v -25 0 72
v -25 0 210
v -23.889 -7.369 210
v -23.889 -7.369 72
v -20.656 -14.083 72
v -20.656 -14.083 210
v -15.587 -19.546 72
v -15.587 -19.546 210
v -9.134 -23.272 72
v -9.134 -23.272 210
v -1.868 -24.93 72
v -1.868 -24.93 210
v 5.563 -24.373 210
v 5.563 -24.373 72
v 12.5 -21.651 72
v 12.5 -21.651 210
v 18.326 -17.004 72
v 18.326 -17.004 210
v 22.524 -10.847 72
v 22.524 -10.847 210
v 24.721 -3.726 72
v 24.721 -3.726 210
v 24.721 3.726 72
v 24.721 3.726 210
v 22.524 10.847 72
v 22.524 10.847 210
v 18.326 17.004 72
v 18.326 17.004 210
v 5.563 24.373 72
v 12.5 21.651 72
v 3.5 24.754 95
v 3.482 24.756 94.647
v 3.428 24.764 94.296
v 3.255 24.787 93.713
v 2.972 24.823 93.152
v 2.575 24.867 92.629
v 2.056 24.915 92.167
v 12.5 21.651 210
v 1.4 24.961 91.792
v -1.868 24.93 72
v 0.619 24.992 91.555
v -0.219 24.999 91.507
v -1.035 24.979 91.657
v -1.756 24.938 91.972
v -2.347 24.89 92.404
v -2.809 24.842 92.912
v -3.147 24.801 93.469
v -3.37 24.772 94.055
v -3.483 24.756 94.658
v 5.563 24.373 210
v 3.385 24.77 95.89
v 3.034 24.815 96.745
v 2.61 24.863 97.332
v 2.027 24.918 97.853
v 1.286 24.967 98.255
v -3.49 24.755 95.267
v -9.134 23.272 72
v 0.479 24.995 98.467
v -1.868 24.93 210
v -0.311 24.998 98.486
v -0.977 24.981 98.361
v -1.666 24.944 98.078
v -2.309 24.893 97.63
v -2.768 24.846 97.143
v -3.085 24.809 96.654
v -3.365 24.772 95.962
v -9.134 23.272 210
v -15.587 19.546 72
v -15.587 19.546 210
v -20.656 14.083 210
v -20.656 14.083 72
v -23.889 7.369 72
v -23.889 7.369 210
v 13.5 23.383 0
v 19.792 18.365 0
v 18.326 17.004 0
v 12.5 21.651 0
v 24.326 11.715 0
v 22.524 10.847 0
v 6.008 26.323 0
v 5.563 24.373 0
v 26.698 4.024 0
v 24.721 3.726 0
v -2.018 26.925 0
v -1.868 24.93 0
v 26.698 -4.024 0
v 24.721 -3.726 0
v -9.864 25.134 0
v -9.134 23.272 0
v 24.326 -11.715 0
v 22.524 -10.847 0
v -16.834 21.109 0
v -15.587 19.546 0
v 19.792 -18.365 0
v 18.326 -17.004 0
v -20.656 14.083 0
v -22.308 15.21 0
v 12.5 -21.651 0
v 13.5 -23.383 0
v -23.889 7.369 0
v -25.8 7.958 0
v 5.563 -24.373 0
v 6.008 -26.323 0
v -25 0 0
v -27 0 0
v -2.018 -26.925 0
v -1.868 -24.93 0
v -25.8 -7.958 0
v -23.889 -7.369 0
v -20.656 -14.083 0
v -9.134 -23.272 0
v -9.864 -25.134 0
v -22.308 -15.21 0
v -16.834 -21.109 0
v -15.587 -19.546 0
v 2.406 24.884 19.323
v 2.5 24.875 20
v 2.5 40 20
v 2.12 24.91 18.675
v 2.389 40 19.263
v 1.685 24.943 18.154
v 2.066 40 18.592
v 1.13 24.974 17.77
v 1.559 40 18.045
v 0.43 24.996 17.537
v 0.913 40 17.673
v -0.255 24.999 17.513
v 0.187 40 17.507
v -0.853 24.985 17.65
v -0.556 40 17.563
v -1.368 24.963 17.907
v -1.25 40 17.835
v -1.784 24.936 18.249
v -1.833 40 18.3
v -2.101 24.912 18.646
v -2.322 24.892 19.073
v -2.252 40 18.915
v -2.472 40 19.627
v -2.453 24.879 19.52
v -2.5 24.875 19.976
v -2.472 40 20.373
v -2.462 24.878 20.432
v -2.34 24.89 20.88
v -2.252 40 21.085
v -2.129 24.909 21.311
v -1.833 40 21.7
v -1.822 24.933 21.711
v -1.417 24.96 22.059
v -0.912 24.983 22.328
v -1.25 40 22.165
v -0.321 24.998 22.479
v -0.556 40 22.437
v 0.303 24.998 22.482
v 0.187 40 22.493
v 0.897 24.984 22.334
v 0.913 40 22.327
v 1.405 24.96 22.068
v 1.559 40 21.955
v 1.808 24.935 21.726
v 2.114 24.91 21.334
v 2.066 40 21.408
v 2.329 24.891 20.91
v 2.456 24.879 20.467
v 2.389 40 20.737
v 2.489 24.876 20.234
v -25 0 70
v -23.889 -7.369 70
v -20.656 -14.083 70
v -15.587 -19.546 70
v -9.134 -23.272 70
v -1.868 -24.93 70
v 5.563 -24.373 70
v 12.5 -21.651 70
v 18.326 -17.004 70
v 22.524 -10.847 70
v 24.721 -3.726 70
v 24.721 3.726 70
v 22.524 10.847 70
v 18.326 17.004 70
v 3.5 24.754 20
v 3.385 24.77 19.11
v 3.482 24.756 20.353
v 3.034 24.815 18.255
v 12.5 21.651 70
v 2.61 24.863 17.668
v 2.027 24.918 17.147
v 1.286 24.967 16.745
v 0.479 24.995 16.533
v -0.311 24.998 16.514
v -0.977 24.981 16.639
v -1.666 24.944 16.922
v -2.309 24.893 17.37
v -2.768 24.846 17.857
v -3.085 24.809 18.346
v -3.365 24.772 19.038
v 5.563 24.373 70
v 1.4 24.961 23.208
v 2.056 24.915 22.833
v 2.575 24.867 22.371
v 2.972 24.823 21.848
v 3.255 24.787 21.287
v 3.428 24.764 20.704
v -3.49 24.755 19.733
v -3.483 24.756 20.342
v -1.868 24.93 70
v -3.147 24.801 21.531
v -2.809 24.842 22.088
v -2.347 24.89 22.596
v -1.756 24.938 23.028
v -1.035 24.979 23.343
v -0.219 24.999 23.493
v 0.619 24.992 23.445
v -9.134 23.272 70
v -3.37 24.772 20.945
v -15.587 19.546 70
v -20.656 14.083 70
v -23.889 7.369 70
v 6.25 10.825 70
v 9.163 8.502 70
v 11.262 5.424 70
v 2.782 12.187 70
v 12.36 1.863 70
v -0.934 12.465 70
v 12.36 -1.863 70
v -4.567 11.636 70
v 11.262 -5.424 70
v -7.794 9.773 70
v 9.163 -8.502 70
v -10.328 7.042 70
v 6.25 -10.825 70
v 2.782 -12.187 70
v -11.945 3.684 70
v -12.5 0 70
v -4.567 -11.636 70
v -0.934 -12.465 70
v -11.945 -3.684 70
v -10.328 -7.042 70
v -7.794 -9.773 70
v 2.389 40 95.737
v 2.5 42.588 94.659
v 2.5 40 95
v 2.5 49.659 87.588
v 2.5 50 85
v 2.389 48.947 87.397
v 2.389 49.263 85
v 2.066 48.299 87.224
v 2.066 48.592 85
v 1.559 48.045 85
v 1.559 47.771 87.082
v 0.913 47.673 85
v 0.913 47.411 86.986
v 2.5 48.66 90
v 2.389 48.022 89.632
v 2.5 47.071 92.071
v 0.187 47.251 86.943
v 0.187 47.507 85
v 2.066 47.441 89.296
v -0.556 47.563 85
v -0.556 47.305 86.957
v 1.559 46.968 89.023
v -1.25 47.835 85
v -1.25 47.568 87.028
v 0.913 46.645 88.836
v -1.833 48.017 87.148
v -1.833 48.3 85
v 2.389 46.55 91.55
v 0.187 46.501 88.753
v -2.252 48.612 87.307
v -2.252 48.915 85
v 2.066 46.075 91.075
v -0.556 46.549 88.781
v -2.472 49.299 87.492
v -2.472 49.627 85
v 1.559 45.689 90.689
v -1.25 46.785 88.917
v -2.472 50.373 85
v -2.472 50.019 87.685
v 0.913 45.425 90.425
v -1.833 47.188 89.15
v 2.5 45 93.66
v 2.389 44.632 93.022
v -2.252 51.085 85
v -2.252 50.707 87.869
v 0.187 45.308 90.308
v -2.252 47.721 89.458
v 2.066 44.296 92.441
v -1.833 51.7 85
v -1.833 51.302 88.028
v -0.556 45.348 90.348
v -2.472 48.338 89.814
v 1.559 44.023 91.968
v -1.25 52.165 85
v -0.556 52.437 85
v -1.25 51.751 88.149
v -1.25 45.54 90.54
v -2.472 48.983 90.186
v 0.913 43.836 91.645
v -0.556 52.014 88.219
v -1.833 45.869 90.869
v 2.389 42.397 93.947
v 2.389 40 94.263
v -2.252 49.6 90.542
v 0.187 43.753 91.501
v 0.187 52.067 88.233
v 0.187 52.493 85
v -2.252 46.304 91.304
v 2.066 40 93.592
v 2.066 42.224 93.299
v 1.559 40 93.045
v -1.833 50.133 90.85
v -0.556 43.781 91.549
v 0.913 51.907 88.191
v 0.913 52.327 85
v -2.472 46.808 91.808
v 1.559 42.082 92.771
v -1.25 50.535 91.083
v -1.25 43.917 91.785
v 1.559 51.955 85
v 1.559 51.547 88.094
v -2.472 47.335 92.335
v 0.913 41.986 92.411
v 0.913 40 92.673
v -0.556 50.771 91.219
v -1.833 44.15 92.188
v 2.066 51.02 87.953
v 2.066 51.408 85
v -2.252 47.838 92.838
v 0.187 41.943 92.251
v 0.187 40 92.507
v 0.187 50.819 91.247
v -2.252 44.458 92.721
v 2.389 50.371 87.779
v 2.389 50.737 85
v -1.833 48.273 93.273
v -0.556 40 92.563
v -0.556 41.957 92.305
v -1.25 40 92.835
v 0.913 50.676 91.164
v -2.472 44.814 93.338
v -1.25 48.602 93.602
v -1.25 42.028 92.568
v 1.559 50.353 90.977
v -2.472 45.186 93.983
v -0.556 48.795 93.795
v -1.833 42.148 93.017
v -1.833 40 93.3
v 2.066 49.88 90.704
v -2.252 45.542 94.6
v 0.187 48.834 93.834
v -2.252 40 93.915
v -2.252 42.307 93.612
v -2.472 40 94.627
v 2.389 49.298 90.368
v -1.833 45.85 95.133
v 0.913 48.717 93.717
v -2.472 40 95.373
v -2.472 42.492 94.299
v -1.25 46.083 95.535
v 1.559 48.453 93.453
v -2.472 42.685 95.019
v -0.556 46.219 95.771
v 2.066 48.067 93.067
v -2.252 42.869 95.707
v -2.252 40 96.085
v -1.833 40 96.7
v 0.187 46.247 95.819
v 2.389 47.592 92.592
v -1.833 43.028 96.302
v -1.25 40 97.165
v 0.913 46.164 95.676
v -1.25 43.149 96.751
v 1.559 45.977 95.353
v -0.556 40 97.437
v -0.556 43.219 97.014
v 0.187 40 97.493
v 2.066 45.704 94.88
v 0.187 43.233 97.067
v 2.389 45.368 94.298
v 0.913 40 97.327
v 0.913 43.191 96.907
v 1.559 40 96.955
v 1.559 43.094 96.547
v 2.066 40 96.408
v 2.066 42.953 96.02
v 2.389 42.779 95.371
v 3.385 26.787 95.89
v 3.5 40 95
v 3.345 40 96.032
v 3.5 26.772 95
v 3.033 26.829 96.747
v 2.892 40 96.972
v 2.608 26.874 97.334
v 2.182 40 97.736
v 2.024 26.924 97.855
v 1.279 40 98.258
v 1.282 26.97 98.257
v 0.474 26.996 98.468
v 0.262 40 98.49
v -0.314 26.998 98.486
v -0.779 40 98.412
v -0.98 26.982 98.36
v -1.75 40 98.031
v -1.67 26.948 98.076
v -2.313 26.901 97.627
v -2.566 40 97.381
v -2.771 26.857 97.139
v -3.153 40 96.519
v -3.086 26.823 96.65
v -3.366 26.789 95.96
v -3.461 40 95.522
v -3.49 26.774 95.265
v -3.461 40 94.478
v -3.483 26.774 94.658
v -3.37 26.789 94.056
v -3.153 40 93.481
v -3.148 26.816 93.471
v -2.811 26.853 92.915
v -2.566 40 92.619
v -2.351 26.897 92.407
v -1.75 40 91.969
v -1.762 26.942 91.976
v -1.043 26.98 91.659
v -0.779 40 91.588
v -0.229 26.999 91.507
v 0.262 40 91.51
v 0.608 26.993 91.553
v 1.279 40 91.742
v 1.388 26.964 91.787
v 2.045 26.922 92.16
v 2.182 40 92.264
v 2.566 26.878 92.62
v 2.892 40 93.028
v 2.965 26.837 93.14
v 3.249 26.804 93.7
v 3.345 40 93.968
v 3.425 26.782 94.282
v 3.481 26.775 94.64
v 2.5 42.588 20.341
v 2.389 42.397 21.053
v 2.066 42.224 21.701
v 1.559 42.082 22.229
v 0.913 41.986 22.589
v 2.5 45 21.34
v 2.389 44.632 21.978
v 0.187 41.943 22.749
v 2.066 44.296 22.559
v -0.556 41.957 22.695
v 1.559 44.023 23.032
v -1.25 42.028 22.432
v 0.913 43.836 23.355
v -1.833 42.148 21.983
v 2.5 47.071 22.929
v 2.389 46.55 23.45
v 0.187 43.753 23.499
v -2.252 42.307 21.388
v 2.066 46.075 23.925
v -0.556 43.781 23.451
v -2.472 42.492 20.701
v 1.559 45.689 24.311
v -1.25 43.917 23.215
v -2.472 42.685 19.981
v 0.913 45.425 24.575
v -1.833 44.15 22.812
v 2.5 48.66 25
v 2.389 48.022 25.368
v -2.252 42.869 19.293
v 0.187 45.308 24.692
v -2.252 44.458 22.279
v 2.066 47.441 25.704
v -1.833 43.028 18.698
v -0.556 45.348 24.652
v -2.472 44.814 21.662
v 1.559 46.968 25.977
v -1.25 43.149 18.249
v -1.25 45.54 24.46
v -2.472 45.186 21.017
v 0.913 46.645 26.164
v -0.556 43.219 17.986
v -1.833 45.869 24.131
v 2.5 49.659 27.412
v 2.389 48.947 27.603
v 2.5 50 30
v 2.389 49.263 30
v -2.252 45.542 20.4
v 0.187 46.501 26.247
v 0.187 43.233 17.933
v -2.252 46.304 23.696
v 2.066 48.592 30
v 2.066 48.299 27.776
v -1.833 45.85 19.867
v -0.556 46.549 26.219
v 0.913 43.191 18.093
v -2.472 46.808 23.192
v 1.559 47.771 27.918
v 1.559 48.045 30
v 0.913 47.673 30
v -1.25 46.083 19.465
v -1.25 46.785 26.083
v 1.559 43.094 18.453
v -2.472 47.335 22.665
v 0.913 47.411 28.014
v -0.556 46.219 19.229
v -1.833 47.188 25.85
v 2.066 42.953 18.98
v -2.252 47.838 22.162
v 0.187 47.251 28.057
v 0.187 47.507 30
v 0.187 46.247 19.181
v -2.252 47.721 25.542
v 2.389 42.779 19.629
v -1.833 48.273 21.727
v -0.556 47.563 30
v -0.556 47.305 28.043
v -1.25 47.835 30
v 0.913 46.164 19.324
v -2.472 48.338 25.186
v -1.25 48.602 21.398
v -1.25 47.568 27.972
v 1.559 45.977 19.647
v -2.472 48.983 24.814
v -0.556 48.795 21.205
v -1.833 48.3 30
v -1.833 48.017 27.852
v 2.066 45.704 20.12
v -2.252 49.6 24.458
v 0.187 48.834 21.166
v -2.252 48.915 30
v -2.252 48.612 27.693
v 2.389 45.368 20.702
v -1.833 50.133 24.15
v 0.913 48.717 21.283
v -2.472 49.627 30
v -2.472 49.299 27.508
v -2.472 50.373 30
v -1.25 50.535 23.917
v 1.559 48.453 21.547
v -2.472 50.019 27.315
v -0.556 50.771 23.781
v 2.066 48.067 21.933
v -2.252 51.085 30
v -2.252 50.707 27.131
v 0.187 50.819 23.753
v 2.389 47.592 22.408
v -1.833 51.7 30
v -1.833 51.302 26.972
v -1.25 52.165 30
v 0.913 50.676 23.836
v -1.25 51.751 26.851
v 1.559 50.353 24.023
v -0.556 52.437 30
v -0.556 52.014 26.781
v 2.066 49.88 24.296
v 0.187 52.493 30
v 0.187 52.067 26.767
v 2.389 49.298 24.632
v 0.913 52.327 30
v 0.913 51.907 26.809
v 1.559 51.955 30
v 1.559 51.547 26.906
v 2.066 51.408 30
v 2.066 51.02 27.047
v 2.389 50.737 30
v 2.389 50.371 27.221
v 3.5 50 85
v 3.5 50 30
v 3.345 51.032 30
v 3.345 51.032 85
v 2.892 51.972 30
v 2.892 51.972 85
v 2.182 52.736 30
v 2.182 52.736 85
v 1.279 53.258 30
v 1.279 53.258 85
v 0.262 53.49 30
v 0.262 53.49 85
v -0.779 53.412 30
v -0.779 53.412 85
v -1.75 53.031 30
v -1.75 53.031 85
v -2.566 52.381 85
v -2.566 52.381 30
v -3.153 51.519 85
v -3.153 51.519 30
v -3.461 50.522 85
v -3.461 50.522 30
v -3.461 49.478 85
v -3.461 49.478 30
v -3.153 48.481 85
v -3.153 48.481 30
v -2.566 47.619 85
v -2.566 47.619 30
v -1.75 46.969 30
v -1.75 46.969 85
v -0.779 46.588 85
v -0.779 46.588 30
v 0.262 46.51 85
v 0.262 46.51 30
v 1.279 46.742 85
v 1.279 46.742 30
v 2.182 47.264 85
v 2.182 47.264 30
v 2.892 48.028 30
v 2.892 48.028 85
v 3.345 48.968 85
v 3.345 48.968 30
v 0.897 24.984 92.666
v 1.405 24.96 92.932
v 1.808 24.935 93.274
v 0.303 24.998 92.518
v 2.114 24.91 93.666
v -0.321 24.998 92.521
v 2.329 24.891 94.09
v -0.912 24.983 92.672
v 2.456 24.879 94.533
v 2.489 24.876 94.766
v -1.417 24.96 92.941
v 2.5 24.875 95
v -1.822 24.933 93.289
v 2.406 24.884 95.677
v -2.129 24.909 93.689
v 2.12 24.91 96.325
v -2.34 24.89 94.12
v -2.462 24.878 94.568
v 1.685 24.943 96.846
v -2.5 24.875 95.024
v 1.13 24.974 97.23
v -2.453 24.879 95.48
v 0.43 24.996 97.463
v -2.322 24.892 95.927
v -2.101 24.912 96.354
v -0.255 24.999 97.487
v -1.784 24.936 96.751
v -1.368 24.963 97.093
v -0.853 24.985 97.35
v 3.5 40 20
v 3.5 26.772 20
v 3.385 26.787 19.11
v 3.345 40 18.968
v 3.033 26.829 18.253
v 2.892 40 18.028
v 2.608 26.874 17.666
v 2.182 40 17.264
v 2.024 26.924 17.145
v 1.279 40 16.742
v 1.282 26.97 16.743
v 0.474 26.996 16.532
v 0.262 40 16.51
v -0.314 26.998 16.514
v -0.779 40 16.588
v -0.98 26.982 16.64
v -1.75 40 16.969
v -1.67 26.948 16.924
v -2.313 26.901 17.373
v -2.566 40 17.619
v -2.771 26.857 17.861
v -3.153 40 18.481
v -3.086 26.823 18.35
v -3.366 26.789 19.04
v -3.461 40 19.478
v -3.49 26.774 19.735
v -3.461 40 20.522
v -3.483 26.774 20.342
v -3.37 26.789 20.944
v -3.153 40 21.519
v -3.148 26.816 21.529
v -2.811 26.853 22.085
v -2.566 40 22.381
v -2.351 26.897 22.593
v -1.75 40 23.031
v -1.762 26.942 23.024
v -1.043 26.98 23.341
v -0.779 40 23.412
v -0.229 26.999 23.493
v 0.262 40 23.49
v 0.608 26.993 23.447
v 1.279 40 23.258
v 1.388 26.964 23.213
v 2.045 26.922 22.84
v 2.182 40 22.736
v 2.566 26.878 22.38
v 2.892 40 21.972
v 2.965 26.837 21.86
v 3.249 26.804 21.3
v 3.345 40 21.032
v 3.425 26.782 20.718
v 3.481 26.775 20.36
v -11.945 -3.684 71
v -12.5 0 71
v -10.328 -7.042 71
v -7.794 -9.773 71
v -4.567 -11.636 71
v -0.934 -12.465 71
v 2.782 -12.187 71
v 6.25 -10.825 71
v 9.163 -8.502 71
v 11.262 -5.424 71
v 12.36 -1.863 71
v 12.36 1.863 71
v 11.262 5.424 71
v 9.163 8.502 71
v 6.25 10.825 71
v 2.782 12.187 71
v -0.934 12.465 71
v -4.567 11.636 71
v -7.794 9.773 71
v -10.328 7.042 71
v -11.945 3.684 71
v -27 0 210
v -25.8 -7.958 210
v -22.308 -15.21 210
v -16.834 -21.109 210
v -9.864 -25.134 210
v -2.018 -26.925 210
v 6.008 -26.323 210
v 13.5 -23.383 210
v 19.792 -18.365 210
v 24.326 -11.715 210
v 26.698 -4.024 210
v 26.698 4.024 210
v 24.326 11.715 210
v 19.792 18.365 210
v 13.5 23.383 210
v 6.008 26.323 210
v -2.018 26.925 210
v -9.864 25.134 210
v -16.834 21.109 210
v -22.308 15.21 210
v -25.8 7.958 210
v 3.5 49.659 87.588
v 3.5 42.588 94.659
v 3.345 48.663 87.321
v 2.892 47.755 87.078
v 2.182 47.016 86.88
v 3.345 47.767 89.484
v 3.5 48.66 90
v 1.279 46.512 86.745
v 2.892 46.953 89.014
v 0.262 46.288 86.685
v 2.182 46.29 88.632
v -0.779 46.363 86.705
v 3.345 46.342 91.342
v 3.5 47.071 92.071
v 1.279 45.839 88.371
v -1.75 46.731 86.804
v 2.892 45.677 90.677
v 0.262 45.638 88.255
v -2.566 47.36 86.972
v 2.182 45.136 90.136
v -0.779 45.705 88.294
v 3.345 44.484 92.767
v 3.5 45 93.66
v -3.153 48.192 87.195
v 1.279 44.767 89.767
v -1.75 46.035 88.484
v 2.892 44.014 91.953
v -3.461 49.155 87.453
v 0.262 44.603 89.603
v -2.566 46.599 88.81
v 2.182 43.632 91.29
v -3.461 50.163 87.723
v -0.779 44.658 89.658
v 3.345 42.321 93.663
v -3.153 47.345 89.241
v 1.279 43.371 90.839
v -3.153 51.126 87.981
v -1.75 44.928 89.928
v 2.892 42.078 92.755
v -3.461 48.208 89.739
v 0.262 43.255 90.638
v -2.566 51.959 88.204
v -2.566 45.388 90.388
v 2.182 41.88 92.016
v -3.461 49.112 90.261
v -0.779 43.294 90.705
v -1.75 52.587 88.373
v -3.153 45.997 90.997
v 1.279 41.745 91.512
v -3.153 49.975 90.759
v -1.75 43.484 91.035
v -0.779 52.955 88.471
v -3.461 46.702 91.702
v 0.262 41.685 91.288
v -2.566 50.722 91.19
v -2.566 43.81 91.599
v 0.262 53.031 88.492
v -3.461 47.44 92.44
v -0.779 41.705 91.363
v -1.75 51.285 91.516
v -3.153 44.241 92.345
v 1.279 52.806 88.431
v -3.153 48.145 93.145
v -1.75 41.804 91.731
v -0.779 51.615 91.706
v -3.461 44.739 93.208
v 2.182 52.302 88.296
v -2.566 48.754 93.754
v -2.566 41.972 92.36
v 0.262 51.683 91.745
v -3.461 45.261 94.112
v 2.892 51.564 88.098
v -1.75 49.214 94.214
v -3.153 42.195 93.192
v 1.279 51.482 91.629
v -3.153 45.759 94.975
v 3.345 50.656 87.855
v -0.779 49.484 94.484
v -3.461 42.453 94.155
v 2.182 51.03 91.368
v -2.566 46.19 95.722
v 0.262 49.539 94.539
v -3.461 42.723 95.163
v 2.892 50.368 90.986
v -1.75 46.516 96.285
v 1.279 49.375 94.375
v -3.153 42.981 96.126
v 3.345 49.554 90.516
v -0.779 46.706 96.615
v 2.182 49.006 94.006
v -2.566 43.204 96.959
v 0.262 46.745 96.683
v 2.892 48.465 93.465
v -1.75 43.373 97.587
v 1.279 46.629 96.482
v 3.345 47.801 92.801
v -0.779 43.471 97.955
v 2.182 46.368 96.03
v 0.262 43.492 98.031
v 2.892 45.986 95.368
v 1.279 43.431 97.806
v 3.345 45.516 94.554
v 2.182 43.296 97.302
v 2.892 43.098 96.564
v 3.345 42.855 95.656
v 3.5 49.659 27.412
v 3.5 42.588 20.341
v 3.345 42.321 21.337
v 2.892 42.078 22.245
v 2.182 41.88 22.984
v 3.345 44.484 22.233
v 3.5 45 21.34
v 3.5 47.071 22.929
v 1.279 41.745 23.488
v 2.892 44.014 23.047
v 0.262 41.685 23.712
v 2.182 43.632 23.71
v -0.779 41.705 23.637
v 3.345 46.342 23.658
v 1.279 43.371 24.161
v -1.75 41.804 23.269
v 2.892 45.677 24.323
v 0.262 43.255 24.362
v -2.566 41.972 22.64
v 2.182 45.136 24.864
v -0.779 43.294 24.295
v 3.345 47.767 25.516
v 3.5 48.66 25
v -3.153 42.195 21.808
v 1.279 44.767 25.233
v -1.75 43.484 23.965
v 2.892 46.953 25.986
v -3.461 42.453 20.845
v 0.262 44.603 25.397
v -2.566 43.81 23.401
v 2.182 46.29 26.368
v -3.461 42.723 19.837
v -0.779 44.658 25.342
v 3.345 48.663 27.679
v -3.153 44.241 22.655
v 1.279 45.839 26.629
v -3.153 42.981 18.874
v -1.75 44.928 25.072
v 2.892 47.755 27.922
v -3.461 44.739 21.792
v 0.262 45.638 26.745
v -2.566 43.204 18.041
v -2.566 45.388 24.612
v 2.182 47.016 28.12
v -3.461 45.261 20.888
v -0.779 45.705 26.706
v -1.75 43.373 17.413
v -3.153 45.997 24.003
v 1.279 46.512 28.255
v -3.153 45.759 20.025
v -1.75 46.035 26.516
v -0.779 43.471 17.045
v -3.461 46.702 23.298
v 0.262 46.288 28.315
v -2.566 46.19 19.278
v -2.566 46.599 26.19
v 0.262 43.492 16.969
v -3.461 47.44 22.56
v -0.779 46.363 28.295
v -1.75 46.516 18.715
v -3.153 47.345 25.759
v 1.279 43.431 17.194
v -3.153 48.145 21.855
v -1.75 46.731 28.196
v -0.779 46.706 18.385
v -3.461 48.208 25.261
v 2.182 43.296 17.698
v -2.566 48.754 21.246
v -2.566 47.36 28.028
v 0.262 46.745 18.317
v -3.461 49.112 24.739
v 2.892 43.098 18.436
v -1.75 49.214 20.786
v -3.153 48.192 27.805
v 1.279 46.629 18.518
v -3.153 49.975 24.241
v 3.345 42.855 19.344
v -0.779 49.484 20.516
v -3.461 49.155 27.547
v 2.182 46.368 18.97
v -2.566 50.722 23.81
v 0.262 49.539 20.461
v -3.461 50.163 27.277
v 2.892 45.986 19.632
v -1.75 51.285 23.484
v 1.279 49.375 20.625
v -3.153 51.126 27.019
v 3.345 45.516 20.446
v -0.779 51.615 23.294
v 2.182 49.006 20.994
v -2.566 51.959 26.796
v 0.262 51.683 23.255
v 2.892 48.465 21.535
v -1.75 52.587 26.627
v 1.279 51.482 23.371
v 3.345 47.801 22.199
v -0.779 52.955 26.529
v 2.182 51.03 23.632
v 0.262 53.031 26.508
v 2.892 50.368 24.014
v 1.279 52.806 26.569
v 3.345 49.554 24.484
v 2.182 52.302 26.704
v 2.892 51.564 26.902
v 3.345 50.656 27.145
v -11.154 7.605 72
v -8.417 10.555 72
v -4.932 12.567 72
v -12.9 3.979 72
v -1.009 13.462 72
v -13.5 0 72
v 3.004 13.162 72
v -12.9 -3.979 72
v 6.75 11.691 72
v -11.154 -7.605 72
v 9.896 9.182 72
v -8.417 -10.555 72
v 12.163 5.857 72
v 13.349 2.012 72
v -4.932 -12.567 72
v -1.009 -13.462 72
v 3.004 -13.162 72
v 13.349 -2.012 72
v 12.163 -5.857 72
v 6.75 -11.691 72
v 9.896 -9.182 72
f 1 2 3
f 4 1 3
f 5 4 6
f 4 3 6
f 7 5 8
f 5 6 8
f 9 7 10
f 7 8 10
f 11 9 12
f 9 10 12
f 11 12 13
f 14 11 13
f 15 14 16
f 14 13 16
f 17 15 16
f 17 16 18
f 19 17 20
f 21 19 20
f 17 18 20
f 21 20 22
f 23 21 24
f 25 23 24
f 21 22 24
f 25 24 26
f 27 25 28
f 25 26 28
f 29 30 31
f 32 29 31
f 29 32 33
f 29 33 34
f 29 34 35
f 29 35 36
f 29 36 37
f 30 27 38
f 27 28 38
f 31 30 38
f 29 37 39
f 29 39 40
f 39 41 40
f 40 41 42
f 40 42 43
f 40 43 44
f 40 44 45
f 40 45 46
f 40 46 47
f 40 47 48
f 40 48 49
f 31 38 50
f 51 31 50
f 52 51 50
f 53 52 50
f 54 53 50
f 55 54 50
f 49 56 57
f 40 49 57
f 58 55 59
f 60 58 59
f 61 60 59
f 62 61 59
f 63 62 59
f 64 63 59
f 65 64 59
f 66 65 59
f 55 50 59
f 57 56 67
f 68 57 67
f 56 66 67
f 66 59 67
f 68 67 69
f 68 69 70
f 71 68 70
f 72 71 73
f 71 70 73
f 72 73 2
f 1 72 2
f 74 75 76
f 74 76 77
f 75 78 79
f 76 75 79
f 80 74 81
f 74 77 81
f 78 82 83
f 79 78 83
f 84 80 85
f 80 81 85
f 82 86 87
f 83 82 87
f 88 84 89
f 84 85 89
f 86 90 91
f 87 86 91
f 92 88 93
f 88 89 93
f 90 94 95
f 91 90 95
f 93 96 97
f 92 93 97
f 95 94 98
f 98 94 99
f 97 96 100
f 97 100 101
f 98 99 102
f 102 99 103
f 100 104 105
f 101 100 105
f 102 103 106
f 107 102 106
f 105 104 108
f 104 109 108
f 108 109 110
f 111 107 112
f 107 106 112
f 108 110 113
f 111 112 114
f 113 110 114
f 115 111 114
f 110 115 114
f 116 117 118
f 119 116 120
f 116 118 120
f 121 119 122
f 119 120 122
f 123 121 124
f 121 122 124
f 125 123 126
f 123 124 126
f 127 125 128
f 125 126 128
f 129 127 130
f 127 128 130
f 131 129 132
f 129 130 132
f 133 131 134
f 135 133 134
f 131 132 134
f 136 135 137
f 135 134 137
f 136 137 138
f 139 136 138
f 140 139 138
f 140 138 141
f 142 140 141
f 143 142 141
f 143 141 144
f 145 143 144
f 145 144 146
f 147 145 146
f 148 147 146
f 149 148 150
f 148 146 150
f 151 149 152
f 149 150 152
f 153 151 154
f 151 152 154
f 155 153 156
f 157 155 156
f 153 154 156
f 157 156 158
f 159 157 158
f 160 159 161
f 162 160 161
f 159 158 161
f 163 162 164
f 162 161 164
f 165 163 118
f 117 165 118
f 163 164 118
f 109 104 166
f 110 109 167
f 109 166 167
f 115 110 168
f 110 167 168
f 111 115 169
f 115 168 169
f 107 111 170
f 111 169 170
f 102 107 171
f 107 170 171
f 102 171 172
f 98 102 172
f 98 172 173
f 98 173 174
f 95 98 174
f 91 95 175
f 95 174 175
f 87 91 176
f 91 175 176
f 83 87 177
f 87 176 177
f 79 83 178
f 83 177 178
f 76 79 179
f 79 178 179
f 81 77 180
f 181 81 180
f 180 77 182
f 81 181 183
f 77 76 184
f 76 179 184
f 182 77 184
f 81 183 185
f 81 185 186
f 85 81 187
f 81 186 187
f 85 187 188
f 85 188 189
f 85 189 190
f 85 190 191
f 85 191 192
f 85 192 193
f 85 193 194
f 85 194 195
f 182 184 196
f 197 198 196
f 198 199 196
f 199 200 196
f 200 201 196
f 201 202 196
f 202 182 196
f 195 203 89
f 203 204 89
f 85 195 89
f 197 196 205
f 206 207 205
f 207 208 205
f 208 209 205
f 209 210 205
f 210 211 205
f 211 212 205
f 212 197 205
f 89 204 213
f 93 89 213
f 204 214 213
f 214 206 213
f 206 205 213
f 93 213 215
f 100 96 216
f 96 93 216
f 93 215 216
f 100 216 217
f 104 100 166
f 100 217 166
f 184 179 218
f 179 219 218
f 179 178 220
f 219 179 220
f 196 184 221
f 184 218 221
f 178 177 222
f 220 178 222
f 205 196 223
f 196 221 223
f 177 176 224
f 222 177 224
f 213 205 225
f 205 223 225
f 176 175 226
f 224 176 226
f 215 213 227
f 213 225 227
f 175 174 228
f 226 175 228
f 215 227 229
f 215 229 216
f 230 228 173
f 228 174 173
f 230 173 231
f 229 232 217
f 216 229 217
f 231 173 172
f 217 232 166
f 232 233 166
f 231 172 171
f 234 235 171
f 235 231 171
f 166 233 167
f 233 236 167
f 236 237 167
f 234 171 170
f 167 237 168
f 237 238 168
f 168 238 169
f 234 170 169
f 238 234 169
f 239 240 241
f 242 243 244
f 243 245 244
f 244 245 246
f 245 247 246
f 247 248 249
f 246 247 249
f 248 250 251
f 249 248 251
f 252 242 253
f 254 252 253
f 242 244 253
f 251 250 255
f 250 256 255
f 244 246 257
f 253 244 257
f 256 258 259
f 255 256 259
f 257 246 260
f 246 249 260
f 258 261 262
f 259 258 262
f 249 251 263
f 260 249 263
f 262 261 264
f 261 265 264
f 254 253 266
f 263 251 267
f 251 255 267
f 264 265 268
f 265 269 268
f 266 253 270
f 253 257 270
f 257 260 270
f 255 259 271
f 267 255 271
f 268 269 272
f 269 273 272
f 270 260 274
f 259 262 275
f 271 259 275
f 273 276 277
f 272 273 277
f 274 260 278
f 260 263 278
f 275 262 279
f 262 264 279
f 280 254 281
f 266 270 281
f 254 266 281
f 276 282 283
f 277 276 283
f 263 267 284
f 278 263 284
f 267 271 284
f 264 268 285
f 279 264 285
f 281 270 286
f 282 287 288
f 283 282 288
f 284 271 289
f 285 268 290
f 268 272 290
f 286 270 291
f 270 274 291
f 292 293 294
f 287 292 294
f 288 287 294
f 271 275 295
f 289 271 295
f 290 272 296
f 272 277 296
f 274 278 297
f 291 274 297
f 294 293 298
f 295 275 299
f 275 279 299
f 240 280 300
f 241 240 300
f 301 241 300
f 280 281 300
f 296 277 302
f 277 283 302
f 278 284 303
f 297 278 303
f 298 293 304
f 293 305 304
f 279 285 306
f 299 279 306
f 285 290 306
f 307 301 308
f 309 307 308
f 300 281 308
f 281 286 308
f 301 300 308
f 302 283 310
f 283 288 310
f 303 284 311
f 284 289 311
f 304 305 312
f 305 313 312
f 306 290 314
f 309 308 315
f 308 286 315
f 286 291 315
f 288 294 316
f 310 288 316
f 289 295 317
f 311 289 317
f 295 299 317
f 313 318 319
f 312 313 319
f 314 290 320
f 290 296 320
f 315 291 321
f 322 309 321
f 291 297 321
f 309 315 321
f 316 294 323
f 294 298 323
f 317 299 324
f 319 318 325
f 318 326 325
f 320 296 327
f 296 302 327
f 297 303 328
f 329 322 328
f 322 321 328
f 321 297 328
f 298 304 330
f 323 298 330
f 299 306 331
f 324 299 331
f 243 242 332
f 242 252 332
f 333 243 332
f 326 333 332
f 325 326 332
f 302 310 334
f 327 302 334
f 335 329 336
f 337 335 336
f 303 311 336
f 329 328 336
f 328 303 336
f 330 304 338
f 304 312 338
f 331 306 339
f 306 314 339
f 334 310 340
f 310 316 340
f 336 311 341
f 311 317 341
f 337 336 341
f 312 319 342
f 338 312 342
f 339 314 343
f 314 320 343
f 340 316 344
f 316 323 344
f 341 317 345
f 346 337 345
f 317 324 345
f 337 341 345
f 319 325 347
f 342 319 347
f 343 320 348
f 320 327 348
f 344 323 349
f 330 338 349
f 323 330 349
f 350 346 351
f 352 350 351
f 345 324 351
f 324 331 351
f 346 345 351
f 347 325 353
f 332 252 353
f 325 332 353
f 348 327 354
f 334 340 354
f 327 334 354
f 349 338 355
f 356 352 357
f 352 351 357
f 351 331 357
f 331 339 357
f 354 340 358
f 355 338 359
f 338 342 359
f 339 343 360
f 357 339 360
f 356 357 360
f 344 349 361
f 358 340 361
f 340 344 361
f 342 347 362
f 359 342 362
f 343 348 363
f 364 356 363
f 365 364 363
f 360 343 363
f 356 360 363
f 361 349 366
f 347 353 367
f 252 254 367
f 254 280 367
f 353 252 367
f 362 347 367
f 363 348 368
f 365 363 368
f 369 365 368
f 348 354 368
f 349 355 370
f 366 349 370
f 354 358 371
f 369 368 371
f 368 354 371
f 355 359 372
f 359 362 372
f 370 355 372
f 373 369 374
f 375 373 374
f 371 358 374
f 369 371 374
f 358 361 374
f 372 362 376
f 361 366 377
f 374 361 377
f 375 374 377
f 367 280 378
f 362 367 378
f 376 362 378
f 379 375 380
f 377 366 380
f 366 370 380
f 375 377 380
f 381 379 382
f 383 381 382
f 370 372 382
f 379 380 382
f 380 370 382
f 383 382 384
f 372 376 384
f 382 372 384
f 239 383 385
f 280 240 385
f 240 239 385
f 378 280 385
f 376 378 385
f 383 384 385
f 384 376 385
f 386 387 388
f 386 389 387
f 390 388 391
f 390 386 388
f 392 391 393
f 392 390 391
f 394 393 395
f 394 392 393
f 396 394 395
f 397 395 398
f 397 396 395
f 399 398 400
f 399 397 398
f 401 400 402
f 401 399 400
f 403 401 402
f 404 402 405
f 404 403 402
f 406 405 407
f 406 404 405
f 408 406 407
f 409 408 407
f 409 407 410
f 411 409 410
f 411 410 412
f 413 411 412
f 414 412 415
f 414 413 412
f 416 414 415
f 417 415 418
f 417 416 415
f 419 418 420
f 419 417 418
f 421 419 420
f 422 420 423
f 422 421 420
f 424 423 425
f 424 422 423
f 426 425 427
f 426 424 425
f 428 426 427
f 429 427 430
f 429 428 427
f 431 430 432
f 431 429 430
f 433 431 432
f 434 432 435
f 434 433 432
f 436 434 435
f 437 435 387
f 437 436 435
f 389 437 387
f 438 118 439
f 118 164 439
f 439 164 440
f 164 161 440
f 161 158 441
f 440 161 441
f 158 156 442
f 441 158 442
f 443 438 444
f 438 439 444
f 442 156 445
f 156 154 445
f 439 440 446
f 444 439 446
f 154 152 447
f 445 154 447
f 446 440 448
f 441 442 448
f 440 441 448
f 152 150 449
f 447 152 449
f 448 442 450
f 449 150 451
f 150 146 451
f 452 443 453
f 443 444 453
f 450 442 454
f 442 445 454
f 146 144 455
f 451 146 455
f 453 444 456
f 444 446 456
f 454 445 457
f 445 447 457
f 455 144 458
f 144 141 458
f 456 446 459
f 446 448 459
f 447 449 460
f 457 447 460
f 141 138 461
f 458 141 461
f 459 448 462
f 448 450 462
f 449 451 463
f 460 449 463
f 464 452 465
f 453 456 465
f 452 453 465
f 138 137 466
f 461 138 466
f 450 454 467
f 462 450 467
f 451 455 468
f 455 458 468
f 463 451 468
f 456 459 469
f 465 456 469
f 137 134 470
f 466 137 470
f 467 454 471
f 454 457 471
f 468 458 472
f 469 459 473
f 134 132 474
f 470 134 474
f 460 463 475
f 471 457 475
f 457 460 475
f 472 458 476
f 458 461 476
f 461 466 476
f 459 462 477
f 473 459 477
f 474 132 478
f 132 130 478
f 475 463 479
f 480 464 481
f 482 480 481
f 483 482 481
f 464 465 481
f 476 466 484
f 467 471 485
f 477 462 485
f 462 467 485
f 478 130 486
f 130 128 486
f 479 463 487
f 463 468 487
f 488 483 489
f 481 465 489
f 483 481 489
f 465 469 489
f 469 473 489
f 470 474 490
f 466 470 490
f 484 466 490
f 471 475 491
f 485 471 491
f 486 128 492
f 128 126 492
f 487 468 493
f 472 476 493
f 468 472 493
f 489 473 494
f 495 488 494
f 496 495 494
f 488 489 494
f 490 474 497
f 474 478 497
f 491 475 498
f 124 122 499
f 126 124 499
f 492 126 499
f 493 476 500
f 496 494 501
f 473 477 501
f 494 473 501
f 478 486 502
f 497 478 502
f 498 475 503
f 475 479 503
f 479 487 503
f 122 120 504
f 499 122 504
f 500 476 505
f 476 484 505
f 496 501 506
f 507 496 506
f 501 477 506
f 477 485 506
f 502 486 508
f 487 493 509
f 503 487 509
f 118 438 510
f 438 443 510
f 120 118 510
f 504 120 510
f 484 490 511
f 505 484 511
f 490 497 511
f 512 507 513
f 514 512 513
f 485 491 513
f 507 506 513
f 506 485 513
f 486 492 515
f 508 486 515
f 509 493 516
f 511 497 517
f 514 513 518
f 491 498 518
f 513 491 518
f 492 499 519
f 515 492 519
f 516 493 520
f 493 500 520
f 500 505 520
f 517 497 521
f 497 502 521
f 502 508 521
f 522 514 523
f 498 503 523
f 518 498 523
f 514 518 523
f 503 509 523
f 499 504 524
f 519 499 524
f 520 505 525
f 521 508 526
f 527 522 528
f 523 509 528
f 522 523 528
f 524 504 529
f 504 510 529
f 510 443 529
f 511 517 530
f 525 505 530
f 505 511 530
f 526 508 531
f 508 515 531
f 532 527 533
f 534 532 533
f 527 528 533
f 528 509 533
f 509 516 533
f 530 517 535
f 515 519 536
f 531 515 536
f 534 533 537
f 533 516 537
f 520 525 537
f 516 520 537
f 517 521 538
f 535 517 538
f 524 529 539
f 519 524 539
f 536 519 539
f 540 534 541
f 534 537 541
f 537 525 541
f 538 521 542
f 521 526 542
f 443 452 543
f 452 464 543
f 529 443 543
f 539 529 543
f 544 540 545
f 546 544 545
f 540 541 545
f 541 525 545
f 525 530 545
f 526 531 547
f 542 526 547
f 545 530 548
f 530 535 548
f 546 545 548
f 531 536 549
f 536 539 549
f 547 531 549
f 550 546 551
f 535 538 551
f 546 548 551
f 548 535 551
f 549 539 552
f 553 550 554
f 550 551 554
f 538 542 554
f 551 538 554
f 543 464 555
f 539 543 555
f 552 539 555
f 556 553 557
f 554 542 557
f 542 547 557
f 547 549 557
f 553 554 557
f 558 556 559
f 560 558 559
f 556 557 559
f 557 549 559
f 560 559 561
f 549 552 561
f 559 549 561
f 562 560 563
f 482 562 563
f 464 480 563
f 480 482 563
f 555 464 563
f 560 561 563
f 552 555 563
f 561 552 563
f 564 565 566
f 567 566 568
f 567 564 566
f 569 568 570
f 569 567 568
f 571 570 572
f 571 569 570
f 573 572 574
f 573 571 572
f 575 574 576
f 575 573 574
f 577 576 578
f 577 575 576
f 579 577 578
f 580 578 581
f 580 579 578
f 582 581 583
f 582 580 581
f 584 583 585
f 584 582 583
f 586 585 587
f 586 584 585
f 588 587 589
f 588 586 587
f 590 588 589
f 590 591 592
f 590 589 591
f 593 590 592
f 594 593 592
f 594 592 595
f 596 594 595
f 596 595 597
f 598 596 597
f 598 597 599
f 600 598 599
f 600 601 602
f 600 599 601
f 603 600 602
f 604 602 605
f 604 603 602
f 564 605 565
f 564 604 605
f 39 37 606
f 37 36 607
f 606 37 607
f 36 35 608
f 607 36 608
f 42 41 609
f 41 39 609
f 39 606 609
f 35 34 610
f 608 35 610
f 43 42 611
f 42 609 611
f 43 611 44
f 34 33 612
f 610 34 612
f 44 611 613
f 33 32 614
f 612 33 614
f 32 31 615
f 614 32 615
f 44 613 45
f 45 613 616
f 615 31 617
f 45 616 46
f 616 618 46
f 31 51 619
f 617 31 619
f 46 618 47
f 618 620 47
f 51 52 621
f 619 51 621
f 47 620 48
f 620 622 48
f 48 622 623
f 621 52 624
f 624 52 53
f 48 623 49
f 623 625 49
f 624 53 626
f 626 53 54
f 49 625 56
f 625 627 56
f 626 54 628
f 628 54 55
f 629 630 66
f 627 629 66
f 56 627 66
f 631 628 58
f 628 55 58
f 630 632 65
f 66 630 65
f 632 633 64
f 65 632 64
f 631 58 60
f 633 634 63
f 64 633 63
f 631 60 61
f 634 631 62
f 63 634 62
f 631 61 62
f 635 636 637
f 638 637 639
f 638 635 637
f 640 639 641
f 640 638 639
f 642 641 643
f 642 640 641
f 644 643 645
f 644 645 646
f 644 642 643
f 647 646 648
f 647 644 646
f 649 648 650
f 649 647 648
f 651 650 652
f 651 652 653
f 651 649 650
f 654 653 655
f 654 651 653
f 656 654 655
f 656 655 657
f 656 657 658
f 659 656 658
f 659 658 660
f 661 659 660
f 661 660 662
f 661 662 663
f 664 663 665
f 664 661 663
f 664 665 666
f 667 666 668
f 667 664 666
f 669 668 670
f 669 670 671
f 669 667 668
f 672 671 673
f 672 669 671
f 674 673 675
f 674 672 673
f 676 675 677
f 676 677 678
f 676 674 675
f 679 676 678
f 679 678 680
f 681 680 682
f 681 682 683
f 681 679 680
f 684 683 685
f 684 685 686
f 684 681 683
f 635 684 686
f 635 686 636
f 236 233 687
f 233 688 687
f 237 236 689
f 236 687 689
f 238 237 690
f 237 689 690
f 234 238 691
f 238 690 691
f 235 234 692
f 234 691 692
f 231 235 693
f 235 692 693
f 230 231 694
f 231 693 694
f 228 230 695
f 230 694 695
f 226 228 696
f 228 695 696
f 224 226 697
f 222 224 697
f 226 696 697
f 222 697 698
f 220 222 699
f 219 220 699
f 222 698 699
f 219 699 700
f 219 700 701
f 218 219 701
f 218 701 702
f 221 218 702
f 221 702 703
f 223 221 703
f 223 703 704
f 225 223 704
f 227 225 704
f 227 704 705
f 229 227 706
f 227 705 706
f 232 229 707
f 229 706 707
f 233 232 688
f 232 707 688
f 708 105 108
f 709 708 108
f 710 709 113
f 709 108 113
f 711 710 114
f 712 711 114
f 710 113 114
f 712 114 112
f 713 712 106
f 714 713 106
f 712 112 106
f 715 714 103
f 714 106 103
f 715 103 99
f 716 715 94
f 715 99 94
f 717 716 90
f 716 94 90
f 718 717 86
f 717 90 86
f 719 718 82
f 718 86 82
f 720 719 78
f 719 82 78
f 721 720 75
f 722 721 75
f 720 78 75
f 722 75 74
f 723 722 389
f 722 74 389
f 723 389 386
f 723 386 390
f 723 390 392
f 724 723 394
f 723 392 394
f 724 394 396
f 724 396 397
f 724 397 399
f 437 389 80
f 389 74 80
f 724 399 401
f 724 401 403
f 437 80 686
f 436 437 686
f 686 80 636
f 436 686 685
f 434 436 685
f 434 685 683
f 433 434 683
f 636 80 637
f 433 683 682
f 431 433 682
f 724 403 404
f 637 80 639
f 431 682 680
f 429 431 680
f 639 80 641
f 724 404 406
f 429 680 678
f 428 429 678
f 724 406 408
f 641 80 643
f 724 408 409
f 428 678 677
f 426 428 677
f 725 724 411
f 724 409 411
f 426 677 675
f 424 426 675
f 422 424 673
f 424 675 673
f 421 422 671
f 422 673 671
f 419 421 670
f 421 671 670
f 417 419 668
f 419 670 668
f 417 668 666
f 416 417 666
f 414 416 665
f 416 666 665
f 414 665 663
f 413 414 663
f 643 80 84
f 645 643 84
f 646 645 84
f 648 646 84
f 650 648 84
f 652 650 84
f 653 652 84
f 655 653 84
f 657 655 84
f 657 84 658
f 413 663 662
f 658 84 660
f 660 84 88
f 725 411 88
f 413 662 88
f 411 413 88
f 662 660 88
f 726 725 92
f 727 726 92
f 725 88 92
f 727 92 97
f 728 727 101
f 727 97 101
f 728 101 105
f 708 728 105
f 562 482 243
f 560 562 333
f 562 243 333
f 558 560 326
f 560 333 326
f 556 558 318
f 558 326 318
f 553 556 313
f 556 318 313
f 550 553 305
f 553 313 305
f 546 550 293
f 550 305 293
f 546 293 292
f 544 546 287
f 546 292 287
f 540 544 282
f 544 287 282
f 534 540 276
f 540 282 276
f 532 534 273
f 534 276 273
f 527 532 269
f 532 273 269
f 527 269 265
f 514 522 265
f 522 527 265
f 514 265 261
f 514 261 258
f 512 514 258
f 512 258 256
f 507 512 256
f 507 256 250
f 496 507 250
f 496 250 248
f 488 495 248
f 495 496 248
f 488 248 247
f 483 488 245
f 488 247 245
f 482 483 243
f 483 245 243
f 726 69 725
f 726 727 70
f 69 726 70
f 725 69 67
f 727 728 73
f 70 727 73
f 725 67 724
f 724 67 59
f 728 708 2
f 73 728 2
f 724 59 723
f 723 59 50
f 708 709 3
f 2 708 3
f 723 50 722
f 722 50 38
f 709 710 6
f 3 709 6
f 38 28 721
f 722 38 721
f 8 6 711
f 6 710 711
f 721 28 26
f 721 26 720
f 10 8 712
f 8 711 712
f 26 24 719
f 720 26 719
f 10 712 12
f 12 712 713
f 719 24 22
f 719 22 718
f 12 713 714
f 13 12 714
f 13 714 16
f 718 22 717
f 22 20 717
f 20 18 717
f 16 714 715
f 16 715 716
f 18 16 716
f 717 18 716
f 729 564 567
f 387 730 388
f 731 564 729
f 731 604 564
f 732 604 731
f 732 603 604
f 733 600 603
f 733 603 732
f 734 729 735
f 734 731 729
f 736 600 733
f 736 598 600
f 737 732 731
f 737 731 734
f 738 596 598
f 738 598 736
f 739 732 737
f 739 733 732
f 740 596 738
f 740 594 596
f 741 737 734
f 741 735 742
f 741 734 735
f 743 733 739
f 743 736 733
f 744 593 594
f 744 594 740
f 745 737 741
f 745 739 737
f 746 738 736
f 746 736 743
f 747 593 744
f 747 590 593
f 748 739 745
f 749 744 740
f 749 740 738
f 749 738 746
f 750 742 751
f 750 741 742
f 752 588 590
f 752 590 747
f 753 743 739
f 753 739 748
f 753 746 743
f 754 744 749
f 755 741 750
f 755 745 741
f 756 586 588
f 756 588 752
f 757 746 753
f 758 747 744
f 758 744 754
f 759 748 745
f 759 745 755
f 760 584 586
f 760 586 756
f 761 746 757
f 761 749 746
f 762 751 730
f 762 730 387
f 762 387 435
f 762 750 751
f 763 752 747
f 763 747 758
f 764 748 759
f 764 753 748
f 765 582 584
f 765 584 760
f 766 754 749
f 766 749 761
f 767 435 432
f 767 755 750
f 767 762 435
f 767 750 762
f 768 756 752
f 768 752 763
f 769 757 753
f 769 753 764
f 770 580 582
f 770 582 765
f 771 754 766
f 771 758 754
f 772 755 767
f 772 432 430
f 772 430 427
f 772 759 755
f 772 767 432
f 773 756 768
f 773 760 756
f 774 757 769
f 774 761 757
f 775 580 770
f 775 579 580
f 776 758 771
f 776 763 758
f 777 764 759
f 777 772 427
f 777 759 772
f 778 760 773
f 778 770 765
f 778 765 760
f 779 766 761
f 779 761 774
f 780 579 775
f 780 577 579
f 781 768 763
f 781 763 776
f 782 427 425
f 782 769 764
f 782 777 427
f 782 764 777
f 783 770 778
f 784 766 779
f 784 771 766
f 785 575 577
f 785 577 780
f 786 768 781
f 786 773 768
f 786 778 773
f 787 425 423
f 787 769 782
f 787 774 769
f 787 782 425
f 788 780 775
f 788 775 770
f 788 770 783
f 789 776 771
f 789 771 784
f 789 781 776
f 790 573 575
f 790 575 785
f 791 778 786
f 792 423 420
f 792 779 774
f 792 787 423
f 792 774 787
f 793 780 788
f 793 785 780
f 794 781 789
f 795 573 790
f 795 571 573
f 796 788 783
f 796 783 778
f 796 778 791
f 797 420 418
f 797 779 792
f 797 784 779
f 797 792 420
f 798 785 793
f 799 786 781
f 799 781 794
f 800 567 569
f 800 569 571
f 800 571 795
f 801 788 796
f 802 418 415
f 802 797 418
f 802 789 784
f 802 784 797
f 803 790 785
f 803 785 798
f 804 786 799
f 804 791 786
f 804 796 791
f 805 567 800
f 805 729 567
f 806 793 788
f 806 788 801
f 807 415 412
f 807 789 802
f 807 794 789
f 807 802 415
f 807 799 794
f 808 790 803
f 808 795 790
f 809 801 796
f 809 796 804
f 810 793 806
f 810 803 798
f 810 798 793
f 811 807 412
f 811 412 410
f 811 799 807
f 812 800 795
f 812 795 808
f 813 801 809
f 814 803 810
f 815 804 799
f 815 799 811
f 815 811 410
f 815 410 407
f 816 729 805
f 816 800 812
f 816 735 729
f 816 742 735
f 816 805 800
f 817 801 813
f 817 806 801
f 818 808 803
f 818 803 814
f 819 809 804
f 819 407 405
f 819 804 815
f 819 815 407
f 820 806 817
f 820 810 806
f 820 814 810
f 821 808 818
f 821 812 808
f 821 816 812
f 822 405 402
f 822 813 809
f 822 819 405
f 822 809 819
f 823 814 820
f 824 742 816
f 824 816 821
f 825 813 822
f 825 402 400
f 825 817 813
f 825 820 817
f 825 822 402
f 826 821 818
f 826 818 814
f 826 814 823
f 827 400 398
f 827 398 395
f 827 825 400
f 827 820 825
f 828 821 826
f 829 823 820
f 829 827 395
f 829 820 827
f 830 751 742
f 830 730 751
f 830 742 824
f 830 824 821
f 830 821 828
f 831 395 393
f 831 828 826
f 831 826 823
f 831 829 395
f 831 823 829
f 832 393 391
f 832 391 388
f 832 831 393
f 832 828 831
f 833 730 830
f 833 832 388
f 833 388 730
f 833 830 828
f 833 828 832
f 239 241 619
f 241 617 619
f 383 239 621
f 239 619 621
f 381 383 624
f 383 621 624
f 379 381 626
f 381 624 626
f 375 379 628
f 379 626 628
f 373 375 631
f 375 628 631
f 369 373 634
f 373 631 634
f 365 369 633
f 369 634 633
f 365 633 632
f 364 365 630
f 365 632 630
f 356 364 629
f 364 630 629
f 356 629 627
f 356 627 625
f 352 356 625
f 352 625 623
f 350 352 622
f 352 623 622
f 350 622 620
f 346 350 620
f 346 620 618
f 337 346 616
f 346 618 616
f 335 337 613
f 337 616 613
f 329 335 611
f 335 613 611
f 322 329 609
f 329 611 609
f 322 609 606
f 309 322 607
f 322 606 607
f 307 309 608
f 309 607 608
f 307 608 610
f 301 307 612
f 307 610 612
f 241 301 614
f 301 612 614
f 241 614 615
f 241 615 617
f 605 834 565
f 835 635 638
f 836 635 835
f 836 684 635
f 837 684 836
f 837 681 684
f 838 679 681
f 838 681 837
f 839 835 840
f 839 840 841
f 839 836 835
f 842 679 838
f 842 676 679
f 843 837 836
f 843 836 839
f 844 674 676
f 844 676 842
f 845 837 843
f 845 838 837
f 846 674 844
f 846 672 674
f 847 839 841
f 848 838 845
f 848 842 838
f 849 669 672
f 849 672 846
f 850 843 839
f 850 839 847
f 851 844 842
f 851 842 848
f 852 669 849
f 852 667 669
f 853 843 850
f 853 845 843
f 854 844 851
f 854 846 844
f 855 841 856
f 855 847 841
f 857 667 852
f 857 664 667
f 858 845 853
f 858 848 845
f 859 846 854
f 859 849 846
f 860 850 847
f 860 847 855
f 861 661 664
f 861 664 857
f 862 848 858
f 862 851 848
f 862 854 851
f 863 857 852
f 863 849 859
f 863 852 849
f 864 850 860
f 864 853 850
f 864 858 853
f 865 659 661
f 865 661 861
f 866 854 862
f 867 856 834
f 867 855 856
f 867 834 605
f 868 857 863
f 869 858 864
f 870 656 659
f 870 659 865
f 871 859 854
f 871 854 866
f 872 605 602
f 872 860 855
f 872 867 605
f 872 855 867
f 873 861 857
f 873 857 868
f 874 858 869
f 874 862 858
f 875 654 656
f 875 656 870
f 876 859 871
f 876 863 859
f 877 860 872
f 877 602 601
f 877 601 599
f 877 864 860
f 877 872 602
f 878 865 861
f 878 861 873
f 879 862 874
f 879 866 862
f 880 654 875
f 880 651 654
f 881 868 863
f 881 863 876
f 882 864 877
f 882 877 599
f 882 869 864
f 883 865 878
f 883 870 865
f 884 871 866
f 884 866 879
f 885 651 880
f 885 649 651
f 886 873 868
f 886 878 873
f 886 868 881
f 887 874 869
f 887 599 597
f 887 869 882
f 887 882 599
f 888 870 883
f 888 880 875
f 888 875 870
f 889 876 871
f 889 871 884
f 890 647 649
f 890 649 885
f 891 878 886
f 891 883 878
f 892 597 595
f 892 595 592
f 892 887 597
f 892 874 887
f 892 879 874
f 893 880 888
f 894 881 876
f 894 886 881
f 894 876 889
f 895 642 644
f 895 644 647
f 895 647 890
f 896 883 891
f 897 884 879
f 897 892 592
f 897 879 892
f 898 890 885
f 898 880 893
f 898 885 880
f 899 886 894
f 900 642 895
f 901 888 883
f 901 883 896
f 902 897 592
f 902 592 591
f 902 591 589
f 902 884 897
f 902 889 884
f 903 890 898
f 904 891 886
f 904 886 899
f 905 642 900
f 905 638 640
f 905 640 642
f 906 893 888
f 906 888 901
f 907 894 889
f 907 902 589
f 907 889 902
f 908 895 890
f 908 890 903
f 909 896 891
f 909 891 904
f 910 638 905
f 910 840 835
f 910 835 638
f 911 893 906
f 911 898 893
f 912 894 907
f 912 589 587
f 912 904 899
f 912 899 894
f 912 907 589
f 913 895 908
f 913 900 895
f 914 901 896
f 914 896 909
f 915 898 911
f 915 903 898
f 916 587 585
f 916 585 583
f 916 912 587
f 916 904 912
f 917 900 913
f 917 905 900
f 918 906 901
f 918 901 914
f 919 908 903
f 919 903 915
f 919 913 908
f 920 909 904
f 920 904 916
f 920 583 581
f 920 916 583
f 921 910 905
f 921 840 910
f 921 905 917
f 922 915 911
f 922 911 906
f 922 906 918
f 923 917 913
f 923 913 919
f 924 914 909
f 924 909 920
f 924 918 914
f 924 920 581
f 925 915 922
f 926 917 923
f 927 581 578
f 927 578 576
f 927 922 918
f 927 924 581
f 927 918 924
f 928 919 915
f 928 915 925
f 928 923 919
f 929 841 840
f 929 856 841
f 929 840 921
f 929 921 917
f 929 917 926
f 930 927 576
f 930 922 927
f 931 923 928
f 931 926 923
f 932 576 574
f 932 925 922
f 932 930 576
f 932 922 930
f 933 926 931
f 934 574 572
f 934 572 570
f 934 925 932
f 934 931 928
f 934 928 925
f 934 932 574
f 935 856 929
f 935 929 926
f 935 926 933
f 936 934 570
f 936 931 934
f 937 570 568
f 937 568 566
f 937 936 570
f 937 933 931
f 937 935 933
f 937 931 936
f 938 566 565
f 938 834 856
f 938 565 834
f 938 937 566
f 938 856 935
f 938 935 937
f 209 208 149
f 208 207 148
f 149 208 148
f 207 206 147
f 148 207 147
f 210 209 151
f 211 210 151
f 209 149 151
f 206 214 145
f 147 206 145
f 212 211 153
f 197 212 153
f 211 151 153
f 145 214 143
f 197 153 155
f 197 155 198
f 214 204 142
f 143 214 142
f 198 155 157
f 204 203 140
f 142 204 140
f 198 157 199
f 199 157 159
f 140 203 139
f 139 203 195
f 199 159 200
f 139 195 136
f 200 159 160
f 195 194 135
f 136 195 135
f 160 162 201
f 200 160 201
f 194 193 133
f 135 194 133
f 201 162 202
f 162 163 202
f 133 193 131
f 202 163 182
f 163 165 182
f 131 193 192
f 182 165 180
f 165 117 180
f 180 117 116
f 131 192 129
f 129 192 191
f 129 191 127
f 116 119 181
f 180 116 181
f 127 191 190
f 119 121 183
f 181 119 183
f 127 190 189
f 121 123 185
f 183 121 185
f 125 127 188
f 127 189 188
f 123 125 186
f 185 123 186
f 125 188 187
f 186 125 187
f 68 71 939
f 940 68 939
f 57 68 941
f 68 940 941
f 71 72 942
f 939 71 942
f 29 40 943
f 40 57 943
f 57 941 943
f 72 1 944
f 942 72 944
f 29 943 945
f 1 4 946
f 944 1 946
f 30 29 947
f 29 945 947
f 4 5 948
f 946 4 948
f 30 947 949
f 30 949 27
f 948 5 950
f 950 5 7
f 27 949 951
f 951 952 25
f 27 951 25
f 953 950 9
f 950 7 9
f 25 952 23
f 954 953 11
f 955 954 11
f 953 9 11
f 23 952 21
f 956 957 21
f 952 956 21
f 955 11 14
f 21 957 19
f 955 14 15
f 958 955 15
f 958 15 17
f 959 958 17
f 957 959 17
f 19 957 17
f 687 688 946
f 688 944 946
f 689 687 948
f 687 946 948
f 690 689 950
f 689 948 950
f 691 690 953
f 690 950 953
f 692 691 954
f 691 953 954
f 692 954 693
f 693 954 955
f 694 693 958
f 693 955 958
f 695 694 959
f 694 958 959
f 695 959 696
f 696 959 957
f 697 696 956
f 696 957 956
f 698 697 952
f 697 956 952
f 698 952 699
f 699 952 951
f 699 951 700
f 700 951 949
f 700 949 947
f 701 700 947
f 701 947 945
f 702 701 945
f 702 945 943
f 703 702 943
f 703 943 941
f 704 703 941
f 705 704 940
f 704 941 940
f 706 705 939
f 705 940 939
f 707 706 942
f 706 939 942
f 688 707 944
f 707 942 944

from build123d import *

# Parameters (mm, degrees)
F3_R      = 3.5
F5_R      = 2.5
F7_R      = 25
F8_DEPTH  = 138
F9_R      = 25
F10_DEPTH = 70


with BuildPart() as f1:
    # F0 (on Front) → F1 (revolve)
    with BuildSketch(Plane.XZ):
        Polygon((-25, 210), (-27, 210), (-27, 0), (-25, 0), (-25, 70), (-12.5, 70), (-12.5, 71), (-13.5, 72), (-25, 72), align=None)
    revolve(axis=Axis((0, 0, 105), (0, 0, 1)))

    # F4: sweep along a path in F2
    with BuildLine(Plane.YZ) as f4_path:
        Line((0, 20), (40, 20))
        ThreePointArc((40, 20), (47.0710678119, 22.9289321881), (50, 30))
        Line((50, 30), (50, 85))
        ThreePointArc((50, 85), (47.0710678119, 92.0710678119), (40, 95))
        Line((40, 95), (0, 95))
    # F3 (on Front) → F4 (sweep)
    with BuildSketch(Plane.XZ):
        with Locations((0, 20)):
            Circle(F3_R)
    sweep(path=f4_path.line)

    # F6: sweep along a path in F2
    with BuildLine(Plane.YZ) as f6_path:
        Line((0, 20), (40, 20))
        ThreePointArc((40, 20), (47.0710678119, 22.9289321881), (50, 30))
        Line((50, 30), (50, 85))
        ThreePointArc((50, 85), (47.0710678119, 92.0710678119), (40, 95))
        Line((40, 95), (0, 95))
    # F5 (on Front) → F6 (sweep, cut)
    with BuildSketch(Plane.XZ):
        with Locations((0, 20)):
            Circle(F5_R)
    sweep(path=f6_path.line, mode=Mode.SUBTRACT)

    # F7 (on face) → F8 (cut, through all)
    with BuildSketch(Plane.XY.offset(210)):
        Circle(F7_R)
    extrude(amount=-F8_DEPTH, mode=Mode.SUBTRACT)

    # F9 (on face) → F10 (cut, through all)
    with BuildSketch(Plane(origin=(0, 0, 0), x_dir=(1, 0, 0), z_dir=(0, 0, -1))):
        Circle(F9_R)
    extrude(amount=-F10_DEPTH, mode=Mode.SUBTRACT)


solid = f1.part
